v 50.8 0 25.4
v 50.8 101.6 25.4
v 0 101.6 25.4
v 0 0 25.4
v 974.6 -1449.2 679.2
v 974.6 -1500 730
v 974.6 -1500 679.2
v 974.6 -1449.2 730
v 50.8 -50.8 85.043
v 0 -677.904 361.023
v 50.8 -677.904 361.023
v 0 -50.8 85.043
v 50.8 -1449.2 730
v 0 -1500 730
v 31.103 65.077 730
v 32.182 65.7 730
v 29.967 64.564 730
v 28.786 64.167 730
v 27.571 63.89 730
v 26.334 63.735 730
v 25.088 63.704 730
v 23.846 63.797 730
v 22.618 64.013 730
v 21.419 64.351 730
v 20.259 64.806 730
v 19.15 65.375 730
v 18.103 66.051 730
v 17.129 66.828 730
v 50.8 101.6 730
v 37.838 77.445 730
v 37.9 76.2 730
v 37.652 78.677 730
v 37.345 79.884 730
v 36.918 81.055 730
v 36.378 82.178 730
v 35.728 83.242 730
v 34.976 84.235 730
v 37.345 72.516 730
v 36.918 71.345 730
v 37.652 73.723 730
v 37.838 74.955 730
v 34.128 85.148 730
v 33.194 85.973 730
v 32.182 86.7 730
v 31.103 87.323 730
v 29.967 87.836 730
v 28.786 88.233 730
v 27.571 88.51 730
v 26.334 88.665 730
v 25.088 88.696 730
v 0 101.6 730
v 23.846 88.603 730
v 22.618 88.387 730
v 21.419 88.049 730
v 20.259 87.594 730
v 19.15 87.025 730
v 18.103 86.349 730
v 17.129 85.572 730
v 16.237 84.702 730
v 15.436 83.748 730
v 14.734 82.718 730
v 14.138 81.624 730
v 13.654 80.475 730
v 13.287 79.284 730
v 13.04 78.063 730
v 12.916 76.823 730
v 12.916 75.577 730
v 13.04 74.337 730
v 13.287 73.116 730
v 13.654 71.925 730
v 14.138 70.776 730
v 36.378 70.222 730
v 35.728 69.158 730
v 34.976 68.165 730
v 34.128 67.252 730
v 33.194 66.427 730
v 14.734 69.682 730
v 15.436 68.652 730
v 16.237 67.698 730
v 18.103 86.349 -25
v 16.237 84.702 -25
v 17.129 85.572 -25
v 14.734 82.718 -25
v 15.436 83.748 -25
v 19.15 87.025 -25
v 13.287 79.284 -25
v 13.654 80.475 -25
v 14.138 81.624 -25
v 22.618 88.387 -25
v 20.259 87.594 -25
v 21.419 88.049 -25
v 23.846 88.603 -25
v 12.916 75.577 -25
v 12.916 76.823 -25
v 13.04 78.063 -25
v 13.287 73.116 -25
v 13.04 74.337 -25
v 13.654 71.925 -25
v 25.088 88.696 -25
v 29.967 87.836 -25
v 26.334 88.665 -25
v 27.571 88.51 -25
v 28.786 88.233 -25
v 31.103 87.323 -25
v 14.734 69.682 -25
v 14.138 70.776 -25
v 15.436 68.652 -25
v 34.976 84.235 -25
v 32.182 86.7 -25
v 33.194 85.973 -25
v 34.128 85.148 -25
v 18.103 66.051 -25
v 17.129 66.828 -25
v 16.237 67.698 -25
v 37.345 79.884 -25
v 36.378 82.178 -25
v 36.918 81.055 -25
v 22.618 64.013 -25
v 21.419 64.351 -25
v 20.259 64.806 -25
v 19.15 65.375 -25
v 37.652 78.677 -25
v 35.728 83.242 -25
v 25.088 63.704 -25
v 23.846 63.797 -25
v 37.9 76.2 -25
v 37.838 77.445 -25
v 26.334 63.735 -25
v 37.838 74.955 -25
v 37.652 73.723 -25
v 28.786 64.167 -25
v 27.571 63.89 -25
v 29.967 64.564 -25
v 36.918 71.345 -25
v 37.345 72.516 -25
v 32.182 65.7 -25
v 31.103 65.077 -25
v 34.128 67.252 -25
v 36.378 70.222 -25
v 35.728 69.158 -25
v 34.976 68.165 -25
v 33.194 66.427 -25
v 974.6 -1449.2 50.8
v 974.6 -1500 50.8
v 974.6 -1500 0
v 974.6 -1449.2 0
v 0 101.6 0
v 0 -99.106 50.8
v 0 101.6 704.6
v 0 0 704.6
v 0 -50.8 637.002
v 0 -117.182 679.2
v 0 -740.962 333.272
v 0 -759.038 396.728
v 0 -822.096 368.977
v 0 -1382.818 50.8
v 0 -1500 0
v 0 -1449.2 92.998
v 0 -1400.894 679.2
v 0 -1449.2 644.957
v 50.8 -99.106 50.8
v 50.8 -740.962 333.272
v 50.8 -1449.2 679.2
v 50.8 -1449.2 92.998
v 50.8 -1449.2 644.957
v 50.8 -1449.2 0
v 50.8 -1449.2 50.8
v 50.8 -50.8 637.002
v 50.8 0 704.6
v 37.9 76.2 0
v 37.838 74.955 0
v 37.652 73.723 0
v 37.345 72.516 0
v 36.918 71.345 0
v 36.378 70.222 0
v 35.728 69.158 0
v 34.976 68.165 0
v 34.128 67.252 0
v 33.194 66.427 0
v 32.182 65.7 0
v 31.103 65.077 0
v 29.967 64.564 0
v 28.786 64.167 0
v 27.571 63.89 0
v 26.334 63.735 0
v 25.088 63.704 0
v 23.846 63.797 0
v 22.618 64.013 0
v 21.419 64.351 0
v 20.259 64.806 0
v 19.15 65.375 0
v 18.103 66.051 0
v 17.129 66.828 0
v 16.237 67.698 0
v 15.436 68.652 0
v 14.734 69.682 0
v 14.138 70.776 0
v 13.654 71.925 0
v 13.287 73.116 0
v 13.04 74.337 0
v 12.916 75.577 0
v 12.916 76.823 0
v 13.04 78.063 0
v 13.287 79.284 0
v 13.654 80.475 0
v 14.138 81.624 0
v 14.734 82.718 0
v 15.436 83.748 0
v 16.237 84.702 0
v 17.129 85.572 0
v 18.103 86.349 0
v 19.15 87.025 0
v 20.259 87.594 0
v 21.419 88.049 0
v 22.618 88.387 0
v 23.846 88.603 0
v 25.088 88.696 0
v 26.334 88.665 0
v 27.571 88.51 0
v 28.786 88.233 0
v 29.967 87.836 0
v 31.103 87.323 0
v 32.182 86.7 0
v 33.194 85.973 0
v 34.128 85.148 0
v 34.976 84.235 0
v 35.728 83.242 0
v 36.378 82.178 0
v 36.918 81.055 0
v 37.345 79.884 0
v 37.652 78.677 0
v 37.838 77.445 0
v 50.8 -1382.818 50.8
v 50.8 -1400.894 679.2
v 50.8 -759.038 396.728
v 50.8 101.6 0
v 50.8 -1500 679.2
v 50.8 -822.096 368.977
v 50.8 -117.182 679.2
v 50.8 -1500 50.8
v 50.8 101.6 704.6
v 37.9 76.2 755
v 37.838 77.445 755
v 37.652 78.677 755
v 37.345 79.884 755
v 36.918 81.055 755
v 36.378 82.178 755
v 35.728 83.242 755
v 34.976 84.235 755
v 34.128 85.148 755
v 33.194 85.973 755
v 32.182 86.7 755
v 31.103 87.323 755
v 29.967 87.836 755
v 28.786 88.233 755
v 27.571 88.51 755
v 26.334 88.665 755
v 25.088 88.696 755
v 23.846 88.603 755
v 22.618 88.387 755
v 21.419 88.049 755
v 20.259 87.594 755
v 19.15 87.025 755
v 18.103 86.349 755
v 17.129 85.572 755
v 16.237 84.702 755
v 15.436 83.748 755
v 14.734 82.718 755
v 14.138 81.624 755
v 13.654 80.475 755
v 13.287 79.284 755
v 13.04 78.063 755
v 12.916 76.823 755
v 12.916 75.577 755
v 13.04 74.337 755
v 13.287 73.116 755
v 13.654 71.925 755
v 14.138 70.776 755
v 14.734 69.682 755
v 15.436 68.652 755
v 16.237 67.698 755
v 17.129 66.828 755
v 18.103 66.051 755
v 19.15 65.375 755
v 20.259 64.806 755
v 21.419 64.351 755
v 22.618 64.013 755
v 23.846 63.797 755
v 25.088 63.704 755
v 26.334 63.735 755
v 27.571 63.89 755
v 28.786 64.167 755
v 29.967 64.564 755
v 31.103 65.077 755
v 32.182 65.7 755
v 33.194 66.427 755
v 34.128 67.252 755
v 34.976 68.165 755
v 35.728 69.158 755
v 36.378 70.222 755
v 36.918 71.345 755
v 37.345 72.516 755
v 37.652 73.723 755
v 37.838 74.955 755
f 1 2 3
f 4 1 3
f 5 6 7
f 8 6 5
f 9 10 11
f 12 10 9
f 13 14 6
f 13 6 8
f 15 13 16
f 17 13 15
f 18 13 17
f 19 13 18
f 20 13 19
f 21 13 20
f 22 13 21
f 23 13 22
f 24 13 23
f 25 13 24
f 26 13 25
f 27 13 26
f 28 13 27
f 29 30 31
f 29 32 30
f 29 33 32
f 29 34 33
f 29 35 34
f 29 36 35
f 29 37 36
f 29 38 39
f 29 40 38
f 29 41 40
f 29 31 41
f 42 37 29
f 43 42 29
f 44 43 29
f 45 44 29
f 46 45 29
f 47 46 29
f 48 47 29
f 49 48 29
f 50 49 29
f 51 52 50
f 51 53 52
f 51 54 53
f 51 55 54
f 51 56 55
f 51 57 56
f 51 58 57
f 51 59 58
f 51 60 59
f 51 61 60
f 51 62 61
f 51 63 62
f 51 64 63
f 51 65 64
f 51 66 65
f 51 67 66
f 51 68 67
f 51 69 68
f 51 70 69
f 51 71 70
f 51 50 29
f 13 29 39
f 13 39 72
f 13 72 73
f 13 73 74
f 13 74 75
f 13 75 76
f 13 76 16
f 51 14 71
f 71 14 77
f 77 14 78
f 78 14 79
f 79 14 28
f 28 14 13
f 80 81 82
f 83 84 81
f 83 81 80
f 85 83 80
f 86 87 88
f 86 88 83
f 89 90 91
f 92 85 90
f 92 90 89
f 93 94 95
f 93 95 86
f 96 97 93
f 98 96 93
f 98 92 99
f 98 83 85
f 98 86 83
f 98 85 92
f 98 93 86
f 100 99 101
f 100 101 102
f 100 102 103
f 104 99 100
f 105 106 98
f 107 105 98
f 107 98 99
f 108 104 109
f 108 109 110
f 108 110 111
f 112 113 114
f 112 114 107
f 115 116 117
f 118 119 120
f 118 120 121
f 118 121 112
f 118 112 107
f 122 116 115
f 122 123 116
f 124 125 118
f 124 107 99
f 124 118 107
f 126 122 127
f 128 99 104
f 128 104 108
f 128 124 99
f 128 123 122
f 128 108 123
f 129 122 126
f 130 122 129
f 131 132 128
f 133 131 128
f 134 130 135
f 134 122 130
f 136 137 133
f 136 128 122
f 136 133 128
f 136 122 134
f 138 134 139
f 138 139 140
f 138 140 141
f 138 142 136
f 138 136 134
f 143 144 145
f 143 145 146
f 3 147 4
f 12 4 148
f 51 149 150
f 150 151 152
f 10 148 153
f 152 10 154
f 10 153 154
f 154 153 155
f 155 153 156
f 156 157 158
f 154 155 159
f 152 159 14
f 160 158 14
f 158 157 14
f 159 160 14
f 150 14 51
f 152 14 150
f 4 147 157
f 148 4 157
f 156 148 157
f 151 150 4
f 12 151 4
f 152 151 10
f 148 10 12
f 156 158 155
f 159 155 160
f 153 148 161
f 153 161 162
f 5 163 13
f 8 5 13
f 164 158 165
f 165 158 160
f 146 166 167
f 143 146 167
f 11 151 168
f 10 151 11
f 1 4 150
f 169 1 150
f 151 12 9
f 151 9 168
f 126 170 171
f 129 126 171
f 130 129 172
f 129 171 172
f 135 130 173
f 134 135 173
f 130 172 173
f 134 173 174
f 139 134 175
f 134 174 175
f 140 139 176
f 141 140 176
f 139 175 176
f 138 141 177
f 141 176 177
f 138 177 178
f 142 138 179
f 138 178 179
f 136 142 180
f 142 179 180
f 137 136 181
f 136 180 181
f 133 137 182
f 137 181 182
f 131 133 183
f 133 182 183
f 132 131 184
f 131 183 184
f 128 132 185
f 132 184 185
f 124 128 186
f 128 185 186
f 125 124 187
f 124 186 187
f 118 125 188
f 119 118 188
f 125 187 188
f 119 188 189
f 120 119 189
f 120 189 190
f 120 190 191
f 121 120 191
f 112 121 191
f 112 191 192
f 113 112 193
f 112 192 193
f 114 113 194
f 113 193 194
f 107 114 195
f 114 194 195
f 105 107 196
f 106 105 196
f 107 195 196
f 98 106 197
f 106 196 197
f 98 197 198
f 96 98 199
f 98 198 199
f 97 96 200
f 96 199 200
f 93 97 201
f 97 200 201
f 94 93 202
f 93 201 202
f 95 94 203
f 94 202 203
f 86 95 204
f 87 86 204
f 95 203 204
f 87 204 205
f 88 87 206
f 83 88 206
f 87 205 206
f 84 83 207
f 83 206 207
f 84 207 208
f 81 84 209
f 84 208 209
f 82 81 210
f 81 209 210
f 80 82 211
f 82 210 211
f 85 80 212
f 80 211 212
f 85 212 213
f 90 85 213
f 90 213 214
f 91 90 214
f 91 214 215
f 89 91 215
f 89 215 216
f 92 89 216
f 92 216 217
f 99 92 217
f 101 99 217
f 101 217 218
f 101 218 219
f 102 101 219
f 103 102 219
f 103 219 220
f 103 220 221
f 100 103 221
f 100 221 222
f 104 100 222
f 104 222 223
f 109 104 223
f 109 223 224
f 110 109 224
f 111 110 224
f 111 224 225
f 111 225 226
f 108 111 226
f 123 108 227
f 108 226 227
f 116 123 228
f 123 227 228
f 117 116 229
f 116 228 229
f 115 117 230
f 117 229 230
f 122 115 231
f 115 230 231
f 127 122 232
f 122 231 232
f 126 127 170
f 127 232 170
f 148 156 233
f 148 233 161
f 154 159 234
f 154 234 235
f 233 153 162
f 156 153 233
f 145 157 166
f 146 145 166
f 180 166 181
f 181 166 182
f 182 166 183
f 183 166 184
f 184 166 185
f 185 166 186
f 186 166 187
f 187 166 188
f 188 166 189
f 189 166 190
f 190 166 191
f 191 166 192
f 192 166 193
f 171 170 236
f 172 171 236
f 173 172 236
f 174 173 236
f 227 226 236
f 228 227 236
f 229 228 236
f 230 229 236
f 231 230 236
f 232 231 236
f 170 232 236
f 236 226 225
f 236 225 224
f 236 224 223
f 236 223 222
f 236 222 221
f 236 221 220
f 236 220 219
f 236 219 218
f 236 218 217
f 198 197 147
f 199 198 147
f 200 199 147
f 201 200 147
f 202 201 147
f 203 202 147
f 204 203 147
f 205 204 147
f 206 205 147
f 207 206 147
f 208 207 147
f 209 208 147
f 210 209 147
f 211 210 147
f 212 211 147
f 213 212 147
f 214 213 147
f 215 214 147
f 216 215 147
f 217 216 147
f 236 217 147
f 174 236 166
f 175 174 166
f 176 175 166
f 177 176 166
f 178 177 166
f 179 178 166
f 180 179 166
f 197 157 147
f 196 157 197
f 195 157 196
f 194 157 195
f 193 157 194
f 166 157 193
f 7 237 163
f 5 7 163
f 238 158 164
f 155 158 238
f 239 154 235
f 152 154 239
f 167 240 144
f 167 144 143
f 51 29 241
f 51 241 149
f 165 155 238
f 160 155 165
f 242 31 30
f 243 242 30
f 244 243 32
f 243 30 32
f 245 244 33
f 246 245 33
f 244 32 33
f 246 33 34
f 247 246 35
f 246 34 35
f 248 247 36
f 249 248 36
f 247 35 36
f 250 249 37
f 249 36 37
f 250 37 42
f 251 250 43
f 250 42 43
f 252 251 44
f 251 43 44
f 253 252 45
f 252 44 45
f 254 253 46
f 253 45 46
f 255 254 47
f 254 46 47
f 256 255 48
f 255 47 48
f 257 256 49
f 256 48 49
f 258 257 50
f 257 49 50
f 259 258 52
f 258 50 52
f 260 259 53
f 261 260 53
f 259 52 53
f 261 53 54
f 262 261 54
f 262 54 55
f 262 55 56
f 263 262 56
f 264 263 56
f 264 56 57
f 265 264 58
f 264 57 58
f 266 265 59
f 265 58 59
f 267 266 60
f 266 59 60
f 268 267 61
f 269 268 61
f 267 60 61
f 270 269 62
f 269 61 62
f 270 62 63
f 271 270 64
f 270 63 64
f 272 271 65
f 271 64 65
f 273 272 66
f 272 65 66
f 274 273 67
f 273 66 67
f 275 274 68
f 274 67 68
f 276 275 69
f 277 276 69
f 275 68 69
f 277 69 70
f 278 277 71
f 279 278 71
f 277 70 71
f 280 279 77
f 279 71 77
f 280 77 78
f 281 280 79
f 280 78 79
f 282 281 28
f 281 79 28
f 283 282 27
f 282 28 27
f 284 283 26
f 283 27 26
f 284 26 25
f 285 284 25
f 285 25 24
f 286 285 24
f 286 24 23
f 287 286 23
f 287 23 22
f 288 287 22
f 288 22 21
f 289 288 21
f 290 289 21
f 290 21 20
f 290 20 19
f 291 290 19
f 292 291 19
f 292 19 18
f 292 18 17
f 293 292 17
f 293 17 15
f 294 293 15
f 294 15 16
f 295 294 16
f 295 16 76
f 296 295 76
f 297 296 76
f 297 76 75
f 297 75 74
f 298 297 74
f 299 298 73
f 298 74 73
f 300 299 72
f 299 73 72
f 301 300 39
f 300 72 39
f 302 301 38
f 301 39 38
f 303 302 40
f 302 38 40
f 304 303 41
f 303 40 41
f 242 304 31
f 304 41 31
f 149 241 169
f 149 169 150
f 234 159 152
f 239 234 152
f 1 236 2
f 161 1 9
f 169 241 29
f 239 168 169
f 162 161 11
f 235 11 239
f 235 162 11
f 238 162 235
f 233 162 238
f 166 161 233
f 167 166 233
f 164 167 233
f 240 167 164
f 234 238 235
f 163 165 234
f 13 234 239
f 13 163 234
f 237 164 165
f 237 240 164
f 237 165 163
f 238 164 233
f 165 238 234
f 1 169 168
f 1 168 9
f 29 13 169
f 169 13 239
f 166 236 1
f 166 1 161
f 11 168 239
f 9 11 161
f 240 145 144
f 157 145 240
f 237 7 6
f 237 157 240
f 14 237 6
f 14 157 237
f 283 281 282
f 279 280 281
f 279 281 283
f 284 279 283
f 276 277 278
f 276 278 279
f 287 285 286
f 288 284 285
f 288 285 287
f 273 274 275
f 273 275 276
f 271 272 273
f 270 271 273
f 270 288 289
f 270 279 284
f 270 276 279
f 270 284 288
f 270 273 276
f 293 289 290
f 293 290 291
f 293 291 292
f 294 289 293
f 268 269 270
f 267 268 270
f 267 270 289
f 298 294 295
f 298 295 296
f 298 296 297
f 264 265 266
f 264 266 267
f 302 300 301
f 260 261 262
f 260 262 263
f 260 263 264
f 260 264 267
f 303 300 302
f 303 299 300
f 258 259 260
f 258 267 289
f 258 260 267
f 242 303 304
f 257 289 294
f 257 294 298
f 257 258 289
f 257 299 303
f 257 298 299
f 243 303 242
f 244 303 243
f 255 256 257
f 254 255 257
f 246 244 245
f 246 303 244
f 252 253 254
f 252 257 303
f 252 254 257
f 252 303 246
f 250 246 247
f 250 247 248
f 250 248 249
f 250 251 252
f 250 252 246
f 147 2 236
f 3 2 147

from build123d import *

# Parameters (mm, degrees)
F0_W      = 1500
F0_H      = 730
F0_W_2    = 1398.4
F0_H_2    = 628.4
F1_DEPTH  = 50.8
F3_DEPTH  = 50.8
F4_W      = 50.8
F4_H      = 25.4
F5_DEPTH  = 101.6
F6_R      = 12.5
F7_DEPTH  = 25
F8_R      = 12.5
F9_DEPTH  = 25
F10_W     = 50.8
F10_H     = 50.8
F11_DEPTH = 923.8


with BuildPart() as f1:
    # F0 (on Right) → F1 (new body)
    with BuildSketch(Plane.YZ):
        with Locations((-750, 365)):
            Rectangle(F0_W, F0_H)
        with Locations((-750, 365)):
            Rectangle(F0_W_2, F0_H_2, mode=Mode.SUBTRACT)
    extrude(amount=F1_DEPTH)

    # F2 (on face) → F3 (join, through all)
    with BuildSketch(Plane(origin=(0, 0, 0), x_dir=(0, -1, 0), z_dir=(-1, 0, 0))):
        Polygon((759.037996, 396.728377), (117.181979, 679.2), (50.8, 679.2), (50.8, 637.002018), (677.904086, 361.022508), (50.8, 85.042998), (50.8, 50.8), (99.105988, 50.8), (740.962004, 333.271623), (1382.818021, 50.8), (1449.2, 50.8), (1449.2, 92.997982), (822.095914, 368.977492), (1449.2, 644.957002), (1449.2, 679.2), (1400.894012, 679.2), align=None)
    extrude(amount=-F3_DEPTH)

    # F4 (on face) → F5 (join)
    with BuildSketch(Plane(origin=(0, 0, 0), x_dir=(-1, 0, 0), z_dir=(0, 1, 0))):
        with Locations((-25.4, 717.3)):
            Rectangle(F4_W, F4_H)
        with Locations((-25.4, 12.7)):
            Rectangle(F4_W, F4_H)
    extrude(amount=F5_DEPTH)

    # F6 (on face) → F7 (join)
    with BuildSketch(Plane.XY.offset(730)):
        with Locations((25.4, 76.2)):
            Circle(F6_R)
    extrude(amount=F7_DEPTH)

    # F8 (on face) → F9 (join)
    with BuildSketch(Plane(origin=(0, 0, 0), x_dir=(1, 0, 0), z_dir=(0, 0, -1))):
        with Locations((25.4, -76.2)):
            Circle(F8_R)
    extrude(amount=F9_DEPTH)

    # F10 (on face) → F11 (join)
    with BuildSketch(Plane.YZ.offset(50.8)):
        with Locations((-1474.6, 704.6)):
            Rectangle(F10_W, F10_H)
        with Locations((-1474.6, 25.4)):
            Rectangle(F10_W, F10_H)
    extrude(amount=F11_DEPTH)


solid = f1.part
